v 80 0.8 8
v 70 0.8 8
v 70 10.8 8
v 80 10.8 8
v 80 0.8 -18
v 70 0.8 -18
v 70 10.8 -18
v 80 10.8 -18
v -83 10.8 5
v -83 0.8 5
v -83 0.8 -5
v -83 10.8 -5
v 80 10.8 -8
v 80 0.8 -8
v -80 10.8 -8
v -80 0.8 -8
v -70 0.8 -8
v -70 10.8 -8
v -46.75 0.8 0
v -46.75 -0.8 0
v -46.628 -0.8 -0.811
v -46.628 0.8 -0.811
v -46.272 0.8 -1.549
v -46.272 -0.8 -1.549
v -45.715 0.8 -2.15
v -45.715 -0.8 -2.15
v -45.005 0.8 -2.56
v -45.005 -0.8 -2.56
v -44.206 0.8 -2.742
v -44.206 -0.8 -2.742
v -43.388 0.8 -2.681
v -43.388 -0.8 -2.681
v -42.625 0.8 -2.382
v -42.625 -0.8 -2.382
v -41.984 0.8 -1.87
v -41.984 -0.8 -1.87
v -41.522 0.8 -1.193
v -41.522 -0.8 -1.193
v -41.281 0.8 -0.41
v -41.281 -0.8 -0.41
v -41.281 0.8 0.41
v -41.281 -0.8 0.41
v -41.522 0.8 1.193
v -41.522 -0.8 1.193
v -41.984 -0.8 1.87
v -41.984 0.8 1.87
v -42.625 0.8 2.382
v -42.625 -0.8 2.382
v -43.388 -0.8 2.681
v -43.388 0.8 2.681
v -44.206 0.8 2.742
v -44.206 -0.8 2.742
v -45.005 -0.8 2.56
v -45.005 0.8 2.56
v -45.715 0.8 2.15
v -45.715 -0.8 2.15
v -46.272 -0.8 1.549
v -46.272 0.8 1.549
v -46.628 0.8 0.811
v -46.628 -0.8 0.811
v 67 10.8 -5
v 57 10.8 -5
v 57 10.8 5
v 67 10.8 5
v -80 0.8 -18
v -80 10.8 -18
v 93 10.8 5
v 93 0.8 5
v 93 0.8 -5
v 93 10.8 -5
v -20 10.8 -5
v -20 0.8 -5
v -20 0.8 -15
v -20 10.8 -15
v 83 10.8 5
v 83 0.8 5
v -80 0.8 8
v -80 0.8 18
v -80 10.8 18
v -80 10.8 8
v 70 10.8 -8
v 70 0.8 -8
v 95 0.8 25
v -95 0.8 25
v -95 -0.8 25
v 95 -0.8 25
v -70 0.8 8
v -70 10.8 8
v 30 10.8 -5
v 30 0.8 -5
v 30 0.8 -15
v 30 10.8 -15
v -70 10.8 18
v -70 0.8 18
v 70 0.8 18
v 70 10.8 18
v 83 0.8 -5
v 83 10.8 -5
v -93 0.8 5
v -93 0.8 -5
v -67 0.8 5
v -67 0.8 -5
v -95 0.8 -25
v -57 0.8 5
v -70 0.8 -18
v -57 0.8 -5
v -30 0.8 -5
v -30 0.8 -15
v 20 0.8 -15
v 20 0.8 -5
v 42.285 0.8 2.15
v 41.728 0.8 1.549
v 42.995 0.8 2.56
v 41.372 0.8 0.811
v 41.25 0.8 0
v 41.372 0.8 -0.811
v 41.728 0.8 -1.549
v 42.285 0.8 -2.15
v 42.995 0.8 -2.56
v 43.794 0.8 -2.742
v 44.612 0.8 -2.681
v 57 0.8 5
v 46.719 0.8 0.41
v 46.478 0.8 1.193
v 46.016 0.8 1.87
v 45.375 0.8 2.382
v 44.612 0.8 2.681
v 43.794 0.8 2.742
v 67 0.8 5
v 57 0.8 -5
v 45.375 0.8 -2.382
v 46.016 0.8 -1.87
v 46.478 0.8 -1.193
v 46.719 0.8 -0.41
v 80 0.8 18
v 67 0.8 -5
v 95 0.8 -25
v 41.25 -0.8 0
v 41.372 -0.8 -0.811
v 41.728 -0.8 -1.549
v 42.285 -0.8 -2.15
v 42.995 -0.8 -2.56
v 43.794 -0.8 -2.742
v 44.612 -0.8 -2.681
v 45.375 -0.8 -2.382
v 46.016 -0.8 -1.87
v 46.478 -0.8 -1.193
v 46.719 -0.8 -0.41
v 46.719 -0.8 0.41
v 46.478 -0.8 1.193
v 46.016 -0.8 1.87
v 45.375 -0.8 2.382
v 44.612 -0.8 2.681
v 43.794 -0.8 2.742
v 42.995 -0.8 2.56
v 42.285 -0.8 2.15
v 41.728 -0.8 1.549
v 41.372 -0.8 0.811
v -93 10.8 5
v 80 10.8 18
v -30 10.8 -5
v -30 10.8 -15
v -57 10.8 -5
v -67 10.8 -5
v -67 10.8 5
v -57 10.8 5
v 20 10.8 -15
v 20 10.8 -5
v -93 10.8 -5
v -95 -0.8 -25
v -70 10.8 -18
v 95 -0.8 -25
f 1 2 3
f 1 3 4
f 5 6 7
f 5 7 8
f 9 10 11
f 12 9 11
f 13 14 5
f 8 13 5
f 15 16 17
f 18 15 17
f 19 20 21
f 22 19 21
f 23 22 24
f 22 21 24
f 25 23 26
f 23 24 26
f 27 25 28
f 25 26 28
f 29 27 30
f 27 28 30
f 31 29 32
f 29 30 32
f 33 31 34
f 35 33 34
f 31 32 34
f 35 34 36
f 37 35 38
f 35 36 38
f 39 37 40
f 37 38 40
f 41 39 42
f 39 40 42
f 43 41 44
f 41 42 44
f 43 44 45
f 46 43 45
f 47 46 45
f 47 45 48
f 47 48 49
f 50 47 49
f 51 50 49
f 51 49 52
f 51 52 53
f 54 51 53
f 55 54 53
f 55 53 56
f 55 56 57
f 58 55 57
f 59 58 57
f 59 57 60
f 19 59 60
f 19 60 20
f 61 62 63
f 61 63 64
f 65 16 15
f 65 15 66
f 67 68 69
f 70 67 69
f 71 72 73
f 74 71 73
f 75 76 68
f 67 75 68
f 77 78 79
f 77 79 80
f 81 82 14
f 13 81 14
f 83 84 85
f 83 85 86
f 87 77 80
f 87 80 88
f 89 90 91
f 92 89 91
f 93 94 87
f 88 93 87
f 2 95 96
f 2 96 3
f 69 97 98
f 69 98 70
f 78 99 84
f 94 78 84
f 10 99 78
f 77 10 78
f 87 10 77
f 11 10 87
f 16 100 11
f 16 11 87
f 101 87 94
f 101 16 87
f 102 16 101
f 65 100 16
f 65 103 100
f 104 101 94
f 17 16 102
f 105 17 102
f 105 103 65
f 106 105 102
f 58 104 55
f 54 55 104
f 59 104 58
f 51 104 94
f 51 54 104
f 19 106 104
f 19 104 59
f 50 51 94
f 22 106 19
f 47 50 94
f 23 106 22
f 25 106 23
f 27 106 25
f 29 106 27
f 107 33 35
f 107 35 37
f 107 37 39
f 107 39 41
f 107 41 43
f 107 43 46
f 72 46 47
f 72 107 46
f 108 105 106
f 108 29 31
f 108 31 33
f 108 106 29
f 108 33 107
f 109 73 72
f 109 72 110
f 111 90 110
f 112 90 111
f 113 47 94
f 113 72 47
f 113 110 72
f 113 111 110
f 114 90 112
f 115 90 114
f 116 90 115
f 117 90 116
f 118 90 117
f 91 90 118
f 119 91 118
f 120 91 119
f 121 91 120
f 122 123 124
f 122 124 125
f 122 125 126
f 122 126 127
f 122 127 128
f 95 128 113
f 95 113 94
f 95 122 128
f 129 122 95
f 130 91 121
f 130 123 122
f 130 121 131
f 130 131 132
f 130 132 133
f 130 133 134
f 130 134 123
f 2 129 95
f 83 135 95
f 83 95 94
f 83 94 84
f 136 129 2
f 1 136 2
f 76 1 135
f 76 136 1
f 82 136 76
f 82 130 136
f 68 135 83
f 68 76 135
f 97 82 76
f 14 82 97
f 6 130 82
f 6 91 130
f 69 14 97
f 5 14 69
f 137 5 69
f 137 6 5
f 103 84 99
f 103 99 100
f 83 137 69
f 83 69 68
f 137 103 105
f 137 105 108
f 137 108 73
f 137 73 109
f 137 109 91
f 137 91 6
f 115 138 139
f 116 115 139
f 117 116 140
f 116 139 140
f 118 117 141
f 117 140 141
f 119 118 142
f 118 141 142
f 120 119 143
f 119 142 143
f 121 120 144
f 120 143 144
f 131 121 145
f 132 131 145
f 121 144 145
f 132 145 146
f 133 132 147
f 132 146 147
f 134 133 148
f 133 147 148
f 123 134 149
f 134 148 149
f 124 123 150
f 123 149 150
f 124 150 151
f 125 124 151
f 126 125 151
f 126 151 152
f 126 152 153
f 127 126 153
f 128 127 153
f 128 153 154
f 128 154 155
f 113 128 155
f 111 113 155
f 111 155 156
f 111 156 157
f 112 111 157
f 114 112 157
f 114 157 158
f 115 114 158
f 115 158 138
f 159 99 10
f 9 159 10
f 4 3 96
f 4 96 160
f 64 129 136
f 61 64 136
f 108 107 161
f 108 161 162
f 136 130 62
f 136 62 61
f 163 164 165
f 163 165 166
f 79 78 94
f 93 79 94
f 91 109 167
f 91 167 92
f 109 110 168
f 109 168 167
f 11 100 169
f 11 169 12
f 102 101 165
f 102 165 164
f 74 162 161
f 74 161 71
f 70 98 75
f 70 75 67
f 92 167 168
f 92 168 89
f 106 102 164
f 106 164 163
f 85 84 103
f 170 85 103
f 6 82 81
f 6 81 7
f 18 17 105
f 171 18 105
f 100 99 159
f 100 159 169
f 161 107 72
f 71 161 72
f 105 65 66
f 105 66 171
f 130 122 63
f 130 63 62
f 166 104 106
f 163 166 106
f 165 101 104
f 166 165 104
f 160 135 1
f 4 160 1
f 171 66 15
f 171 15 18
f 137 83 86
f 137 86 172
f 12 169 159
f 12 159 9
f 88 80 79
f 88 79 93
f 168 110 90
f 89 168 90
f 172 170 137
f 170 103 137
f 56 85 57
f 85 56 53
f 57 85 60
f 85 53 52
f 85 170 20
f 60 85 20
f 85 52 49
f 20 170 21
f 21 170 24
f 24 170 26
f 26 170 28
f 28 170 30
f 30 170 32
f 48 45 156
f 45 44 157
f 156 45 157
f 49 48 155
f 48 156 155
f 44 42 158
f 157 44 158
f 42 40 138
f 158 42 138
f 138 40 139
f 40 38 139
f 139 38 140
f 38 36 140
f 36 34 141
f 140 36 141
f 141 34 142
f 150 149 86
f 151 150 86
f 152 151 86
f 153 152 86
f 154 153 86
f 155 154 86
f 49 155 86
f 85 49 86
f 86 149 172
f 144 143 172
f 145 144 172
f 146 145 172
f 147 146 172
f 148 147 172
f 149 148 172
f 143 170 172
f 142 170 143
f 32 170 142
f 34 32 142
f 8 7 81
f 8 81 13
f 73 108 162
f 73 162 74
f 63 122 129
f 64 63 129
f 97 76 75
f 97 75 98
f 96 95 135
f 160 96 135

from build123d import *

# Parameters (mm, degrees)
SKETCH1_W            = 190
SKETCH1_H            = 50
BASE_DEPTH           = 0.8
SKETCH2_W            = 10
SKETCH2_H            = 10
SWITCHES_DEPTH       = 10
M5_CLEARANCE_HOLE1_D = 5.5


with BuildPart() as part:
    # Sketch1 → Base (new body, symmetric)
    with BuildSketch(Plane(origin=(0, 0, 0), x_dir=(1, 0, 0), z_dir=(0, 1, 0))):
        Rectangle(SKETCH1_W, SKETCH1_H)
    extrude(amount=BASE_DEPTH, both=True)

    # Sketch2 → Switches (add)
    with BuildSketch(Plane(origin=(0, 0.8, 0), x_dir=(1, 0, 0), z_dir=(0, 1, 0))):
        with Locations((-62, 0)):
            Rectangle(SKETCH2_W, SKETCH2_H)
        with Locations((-75, 13)):
            Rectangle(SKETCH2_W, SKETCH2_H)
        with Locations((-75, -13)):
            Rectangle(SKETCH2_W, SKETCH2_H)
        with Locations((-88, 0)):
            Rectangle(SKETCH2_W, SKETCH2_H)
        with Locations((-25, 10)):
            Rectangle(SKETCH2_W, SKETCH2_H)
        with Locations((25, 10)):
            Rectangle(SKETCH2_W, SKETCH2_H)
        with Locations((88, 0)):
            Rectangle(SKETCH2_W, SKETCH2_H)
        with Locations((75, -13)):
            Rectangle(SKETCH2_W, SKETCH2_H)
        with Locations((62, 0)):
            Rectangle(SKETCH2_W, SKETCH2_H)
        with Locations((75, 13)):
            Rectangle(SKETCH2_W, SKETCH2_H)
    extrude(amount=SWITCHES_DEPTH)

    # M5 Clearance Hole1 (through all)
    with Locations(Plane(origin=(0, 0.8, 0), x_dir=(1, 0, 0), z_dir=(0, 1, 0))):
        with Locations((-44, 0), (44, 0)):
            Hole(M5_CLEARANCE_HOLE1_D / 2)


solid = part.part
